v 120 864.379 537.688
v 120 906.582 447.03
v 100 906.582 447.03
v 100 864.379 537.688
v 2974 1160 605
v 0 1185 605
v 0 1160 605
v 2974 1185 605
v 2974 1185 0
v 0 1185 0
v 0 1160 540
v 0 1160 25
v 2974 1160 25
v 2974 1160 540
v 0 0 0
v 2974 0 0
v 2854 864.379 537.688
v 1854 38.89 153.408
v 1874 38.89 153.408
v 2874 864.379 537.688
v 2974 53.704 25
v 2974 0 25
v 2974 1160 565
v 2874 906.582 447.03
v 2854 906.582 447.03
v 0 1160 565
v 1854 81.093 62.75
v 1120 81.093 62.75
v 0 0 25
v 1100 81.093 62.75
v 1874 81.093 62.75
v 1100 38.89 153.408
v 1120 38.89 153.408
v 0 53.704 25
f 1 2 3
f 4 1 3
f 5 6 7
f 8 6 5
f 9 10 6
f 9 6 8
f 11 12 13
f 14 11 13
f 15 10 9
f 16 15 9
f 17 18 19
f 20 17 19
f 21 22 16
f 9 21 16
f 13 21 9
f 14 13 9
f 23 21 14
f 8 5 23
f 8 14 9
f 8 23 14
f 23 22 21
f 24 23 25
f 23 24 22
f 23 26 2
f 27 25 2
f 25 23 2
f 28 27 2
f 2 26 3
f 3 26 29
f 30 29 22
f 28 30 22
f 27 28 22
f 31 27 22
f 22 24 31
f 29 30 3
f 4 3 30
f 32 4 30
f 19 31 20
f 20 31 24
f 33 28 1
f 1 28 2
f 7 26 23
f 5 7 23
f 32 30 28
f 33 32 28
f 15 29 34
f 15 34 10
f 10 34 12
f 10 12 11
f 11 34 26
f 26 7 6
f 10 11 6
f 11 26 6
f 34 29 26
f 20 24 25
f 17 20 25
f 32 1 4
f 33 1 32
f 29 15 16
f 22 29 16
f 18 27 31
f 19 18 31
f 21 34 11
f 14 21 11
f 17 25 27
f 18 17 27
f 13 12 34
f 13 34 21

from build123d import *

# Parameters (mm, degrees)
F1_W     = 2974
F1_H     = 1185
F2_DEPTH = 25
F3_W     = 2974
F3_H     = 25
F4_DEPTH = 580
F6_DEPTH = 2974
F8_DEPTH = 100


with BuildPart() as f2:
    # F1 (on Top) → F2 (new body)
    with BuildSketch(Plane.XY):
        with Locations((1487, 592.5)):
            Rectangle(F1_W, F1_H)
    extrude(amount=F2_DEPTH)

    # F3 (on face) → F4 (join)
    with BuildSketch(Plane.XY.offset(25)):
        with Locations((1487, 1172.5)):
            Rectangle(F3_W, F3_H)
    extrude(amount=F4_DEPTH)

    # F5 (on Right) → F6 (join)
    with BuildSketch(Plane.YZ):
        Polygon((1160, 540), (1160, 565), (0, 25), (53.7037037037, 25), align=None)
    extrude(amount=F6_DEPTH)

    # F7 (on face) → F8 (join)
    with BuildSketch(Plane(origin=(0, -9.5651111654, 20.5472758368), x_dir=(1, 0, 0), z_dir=(0, -0.4220295802, 0.9065820611))):
        Polygon((120, 1010.5507395039), (100, 1010.5507395039), (1100, 100), (1120, 100), align=None)
        Polygon((1874, 100), (2874, 1010.5507395039), (2854, 1010.5507395039), (1854, 100), align=None)
    extrude(amount=F8_DEPTH)


solid = f2.part
